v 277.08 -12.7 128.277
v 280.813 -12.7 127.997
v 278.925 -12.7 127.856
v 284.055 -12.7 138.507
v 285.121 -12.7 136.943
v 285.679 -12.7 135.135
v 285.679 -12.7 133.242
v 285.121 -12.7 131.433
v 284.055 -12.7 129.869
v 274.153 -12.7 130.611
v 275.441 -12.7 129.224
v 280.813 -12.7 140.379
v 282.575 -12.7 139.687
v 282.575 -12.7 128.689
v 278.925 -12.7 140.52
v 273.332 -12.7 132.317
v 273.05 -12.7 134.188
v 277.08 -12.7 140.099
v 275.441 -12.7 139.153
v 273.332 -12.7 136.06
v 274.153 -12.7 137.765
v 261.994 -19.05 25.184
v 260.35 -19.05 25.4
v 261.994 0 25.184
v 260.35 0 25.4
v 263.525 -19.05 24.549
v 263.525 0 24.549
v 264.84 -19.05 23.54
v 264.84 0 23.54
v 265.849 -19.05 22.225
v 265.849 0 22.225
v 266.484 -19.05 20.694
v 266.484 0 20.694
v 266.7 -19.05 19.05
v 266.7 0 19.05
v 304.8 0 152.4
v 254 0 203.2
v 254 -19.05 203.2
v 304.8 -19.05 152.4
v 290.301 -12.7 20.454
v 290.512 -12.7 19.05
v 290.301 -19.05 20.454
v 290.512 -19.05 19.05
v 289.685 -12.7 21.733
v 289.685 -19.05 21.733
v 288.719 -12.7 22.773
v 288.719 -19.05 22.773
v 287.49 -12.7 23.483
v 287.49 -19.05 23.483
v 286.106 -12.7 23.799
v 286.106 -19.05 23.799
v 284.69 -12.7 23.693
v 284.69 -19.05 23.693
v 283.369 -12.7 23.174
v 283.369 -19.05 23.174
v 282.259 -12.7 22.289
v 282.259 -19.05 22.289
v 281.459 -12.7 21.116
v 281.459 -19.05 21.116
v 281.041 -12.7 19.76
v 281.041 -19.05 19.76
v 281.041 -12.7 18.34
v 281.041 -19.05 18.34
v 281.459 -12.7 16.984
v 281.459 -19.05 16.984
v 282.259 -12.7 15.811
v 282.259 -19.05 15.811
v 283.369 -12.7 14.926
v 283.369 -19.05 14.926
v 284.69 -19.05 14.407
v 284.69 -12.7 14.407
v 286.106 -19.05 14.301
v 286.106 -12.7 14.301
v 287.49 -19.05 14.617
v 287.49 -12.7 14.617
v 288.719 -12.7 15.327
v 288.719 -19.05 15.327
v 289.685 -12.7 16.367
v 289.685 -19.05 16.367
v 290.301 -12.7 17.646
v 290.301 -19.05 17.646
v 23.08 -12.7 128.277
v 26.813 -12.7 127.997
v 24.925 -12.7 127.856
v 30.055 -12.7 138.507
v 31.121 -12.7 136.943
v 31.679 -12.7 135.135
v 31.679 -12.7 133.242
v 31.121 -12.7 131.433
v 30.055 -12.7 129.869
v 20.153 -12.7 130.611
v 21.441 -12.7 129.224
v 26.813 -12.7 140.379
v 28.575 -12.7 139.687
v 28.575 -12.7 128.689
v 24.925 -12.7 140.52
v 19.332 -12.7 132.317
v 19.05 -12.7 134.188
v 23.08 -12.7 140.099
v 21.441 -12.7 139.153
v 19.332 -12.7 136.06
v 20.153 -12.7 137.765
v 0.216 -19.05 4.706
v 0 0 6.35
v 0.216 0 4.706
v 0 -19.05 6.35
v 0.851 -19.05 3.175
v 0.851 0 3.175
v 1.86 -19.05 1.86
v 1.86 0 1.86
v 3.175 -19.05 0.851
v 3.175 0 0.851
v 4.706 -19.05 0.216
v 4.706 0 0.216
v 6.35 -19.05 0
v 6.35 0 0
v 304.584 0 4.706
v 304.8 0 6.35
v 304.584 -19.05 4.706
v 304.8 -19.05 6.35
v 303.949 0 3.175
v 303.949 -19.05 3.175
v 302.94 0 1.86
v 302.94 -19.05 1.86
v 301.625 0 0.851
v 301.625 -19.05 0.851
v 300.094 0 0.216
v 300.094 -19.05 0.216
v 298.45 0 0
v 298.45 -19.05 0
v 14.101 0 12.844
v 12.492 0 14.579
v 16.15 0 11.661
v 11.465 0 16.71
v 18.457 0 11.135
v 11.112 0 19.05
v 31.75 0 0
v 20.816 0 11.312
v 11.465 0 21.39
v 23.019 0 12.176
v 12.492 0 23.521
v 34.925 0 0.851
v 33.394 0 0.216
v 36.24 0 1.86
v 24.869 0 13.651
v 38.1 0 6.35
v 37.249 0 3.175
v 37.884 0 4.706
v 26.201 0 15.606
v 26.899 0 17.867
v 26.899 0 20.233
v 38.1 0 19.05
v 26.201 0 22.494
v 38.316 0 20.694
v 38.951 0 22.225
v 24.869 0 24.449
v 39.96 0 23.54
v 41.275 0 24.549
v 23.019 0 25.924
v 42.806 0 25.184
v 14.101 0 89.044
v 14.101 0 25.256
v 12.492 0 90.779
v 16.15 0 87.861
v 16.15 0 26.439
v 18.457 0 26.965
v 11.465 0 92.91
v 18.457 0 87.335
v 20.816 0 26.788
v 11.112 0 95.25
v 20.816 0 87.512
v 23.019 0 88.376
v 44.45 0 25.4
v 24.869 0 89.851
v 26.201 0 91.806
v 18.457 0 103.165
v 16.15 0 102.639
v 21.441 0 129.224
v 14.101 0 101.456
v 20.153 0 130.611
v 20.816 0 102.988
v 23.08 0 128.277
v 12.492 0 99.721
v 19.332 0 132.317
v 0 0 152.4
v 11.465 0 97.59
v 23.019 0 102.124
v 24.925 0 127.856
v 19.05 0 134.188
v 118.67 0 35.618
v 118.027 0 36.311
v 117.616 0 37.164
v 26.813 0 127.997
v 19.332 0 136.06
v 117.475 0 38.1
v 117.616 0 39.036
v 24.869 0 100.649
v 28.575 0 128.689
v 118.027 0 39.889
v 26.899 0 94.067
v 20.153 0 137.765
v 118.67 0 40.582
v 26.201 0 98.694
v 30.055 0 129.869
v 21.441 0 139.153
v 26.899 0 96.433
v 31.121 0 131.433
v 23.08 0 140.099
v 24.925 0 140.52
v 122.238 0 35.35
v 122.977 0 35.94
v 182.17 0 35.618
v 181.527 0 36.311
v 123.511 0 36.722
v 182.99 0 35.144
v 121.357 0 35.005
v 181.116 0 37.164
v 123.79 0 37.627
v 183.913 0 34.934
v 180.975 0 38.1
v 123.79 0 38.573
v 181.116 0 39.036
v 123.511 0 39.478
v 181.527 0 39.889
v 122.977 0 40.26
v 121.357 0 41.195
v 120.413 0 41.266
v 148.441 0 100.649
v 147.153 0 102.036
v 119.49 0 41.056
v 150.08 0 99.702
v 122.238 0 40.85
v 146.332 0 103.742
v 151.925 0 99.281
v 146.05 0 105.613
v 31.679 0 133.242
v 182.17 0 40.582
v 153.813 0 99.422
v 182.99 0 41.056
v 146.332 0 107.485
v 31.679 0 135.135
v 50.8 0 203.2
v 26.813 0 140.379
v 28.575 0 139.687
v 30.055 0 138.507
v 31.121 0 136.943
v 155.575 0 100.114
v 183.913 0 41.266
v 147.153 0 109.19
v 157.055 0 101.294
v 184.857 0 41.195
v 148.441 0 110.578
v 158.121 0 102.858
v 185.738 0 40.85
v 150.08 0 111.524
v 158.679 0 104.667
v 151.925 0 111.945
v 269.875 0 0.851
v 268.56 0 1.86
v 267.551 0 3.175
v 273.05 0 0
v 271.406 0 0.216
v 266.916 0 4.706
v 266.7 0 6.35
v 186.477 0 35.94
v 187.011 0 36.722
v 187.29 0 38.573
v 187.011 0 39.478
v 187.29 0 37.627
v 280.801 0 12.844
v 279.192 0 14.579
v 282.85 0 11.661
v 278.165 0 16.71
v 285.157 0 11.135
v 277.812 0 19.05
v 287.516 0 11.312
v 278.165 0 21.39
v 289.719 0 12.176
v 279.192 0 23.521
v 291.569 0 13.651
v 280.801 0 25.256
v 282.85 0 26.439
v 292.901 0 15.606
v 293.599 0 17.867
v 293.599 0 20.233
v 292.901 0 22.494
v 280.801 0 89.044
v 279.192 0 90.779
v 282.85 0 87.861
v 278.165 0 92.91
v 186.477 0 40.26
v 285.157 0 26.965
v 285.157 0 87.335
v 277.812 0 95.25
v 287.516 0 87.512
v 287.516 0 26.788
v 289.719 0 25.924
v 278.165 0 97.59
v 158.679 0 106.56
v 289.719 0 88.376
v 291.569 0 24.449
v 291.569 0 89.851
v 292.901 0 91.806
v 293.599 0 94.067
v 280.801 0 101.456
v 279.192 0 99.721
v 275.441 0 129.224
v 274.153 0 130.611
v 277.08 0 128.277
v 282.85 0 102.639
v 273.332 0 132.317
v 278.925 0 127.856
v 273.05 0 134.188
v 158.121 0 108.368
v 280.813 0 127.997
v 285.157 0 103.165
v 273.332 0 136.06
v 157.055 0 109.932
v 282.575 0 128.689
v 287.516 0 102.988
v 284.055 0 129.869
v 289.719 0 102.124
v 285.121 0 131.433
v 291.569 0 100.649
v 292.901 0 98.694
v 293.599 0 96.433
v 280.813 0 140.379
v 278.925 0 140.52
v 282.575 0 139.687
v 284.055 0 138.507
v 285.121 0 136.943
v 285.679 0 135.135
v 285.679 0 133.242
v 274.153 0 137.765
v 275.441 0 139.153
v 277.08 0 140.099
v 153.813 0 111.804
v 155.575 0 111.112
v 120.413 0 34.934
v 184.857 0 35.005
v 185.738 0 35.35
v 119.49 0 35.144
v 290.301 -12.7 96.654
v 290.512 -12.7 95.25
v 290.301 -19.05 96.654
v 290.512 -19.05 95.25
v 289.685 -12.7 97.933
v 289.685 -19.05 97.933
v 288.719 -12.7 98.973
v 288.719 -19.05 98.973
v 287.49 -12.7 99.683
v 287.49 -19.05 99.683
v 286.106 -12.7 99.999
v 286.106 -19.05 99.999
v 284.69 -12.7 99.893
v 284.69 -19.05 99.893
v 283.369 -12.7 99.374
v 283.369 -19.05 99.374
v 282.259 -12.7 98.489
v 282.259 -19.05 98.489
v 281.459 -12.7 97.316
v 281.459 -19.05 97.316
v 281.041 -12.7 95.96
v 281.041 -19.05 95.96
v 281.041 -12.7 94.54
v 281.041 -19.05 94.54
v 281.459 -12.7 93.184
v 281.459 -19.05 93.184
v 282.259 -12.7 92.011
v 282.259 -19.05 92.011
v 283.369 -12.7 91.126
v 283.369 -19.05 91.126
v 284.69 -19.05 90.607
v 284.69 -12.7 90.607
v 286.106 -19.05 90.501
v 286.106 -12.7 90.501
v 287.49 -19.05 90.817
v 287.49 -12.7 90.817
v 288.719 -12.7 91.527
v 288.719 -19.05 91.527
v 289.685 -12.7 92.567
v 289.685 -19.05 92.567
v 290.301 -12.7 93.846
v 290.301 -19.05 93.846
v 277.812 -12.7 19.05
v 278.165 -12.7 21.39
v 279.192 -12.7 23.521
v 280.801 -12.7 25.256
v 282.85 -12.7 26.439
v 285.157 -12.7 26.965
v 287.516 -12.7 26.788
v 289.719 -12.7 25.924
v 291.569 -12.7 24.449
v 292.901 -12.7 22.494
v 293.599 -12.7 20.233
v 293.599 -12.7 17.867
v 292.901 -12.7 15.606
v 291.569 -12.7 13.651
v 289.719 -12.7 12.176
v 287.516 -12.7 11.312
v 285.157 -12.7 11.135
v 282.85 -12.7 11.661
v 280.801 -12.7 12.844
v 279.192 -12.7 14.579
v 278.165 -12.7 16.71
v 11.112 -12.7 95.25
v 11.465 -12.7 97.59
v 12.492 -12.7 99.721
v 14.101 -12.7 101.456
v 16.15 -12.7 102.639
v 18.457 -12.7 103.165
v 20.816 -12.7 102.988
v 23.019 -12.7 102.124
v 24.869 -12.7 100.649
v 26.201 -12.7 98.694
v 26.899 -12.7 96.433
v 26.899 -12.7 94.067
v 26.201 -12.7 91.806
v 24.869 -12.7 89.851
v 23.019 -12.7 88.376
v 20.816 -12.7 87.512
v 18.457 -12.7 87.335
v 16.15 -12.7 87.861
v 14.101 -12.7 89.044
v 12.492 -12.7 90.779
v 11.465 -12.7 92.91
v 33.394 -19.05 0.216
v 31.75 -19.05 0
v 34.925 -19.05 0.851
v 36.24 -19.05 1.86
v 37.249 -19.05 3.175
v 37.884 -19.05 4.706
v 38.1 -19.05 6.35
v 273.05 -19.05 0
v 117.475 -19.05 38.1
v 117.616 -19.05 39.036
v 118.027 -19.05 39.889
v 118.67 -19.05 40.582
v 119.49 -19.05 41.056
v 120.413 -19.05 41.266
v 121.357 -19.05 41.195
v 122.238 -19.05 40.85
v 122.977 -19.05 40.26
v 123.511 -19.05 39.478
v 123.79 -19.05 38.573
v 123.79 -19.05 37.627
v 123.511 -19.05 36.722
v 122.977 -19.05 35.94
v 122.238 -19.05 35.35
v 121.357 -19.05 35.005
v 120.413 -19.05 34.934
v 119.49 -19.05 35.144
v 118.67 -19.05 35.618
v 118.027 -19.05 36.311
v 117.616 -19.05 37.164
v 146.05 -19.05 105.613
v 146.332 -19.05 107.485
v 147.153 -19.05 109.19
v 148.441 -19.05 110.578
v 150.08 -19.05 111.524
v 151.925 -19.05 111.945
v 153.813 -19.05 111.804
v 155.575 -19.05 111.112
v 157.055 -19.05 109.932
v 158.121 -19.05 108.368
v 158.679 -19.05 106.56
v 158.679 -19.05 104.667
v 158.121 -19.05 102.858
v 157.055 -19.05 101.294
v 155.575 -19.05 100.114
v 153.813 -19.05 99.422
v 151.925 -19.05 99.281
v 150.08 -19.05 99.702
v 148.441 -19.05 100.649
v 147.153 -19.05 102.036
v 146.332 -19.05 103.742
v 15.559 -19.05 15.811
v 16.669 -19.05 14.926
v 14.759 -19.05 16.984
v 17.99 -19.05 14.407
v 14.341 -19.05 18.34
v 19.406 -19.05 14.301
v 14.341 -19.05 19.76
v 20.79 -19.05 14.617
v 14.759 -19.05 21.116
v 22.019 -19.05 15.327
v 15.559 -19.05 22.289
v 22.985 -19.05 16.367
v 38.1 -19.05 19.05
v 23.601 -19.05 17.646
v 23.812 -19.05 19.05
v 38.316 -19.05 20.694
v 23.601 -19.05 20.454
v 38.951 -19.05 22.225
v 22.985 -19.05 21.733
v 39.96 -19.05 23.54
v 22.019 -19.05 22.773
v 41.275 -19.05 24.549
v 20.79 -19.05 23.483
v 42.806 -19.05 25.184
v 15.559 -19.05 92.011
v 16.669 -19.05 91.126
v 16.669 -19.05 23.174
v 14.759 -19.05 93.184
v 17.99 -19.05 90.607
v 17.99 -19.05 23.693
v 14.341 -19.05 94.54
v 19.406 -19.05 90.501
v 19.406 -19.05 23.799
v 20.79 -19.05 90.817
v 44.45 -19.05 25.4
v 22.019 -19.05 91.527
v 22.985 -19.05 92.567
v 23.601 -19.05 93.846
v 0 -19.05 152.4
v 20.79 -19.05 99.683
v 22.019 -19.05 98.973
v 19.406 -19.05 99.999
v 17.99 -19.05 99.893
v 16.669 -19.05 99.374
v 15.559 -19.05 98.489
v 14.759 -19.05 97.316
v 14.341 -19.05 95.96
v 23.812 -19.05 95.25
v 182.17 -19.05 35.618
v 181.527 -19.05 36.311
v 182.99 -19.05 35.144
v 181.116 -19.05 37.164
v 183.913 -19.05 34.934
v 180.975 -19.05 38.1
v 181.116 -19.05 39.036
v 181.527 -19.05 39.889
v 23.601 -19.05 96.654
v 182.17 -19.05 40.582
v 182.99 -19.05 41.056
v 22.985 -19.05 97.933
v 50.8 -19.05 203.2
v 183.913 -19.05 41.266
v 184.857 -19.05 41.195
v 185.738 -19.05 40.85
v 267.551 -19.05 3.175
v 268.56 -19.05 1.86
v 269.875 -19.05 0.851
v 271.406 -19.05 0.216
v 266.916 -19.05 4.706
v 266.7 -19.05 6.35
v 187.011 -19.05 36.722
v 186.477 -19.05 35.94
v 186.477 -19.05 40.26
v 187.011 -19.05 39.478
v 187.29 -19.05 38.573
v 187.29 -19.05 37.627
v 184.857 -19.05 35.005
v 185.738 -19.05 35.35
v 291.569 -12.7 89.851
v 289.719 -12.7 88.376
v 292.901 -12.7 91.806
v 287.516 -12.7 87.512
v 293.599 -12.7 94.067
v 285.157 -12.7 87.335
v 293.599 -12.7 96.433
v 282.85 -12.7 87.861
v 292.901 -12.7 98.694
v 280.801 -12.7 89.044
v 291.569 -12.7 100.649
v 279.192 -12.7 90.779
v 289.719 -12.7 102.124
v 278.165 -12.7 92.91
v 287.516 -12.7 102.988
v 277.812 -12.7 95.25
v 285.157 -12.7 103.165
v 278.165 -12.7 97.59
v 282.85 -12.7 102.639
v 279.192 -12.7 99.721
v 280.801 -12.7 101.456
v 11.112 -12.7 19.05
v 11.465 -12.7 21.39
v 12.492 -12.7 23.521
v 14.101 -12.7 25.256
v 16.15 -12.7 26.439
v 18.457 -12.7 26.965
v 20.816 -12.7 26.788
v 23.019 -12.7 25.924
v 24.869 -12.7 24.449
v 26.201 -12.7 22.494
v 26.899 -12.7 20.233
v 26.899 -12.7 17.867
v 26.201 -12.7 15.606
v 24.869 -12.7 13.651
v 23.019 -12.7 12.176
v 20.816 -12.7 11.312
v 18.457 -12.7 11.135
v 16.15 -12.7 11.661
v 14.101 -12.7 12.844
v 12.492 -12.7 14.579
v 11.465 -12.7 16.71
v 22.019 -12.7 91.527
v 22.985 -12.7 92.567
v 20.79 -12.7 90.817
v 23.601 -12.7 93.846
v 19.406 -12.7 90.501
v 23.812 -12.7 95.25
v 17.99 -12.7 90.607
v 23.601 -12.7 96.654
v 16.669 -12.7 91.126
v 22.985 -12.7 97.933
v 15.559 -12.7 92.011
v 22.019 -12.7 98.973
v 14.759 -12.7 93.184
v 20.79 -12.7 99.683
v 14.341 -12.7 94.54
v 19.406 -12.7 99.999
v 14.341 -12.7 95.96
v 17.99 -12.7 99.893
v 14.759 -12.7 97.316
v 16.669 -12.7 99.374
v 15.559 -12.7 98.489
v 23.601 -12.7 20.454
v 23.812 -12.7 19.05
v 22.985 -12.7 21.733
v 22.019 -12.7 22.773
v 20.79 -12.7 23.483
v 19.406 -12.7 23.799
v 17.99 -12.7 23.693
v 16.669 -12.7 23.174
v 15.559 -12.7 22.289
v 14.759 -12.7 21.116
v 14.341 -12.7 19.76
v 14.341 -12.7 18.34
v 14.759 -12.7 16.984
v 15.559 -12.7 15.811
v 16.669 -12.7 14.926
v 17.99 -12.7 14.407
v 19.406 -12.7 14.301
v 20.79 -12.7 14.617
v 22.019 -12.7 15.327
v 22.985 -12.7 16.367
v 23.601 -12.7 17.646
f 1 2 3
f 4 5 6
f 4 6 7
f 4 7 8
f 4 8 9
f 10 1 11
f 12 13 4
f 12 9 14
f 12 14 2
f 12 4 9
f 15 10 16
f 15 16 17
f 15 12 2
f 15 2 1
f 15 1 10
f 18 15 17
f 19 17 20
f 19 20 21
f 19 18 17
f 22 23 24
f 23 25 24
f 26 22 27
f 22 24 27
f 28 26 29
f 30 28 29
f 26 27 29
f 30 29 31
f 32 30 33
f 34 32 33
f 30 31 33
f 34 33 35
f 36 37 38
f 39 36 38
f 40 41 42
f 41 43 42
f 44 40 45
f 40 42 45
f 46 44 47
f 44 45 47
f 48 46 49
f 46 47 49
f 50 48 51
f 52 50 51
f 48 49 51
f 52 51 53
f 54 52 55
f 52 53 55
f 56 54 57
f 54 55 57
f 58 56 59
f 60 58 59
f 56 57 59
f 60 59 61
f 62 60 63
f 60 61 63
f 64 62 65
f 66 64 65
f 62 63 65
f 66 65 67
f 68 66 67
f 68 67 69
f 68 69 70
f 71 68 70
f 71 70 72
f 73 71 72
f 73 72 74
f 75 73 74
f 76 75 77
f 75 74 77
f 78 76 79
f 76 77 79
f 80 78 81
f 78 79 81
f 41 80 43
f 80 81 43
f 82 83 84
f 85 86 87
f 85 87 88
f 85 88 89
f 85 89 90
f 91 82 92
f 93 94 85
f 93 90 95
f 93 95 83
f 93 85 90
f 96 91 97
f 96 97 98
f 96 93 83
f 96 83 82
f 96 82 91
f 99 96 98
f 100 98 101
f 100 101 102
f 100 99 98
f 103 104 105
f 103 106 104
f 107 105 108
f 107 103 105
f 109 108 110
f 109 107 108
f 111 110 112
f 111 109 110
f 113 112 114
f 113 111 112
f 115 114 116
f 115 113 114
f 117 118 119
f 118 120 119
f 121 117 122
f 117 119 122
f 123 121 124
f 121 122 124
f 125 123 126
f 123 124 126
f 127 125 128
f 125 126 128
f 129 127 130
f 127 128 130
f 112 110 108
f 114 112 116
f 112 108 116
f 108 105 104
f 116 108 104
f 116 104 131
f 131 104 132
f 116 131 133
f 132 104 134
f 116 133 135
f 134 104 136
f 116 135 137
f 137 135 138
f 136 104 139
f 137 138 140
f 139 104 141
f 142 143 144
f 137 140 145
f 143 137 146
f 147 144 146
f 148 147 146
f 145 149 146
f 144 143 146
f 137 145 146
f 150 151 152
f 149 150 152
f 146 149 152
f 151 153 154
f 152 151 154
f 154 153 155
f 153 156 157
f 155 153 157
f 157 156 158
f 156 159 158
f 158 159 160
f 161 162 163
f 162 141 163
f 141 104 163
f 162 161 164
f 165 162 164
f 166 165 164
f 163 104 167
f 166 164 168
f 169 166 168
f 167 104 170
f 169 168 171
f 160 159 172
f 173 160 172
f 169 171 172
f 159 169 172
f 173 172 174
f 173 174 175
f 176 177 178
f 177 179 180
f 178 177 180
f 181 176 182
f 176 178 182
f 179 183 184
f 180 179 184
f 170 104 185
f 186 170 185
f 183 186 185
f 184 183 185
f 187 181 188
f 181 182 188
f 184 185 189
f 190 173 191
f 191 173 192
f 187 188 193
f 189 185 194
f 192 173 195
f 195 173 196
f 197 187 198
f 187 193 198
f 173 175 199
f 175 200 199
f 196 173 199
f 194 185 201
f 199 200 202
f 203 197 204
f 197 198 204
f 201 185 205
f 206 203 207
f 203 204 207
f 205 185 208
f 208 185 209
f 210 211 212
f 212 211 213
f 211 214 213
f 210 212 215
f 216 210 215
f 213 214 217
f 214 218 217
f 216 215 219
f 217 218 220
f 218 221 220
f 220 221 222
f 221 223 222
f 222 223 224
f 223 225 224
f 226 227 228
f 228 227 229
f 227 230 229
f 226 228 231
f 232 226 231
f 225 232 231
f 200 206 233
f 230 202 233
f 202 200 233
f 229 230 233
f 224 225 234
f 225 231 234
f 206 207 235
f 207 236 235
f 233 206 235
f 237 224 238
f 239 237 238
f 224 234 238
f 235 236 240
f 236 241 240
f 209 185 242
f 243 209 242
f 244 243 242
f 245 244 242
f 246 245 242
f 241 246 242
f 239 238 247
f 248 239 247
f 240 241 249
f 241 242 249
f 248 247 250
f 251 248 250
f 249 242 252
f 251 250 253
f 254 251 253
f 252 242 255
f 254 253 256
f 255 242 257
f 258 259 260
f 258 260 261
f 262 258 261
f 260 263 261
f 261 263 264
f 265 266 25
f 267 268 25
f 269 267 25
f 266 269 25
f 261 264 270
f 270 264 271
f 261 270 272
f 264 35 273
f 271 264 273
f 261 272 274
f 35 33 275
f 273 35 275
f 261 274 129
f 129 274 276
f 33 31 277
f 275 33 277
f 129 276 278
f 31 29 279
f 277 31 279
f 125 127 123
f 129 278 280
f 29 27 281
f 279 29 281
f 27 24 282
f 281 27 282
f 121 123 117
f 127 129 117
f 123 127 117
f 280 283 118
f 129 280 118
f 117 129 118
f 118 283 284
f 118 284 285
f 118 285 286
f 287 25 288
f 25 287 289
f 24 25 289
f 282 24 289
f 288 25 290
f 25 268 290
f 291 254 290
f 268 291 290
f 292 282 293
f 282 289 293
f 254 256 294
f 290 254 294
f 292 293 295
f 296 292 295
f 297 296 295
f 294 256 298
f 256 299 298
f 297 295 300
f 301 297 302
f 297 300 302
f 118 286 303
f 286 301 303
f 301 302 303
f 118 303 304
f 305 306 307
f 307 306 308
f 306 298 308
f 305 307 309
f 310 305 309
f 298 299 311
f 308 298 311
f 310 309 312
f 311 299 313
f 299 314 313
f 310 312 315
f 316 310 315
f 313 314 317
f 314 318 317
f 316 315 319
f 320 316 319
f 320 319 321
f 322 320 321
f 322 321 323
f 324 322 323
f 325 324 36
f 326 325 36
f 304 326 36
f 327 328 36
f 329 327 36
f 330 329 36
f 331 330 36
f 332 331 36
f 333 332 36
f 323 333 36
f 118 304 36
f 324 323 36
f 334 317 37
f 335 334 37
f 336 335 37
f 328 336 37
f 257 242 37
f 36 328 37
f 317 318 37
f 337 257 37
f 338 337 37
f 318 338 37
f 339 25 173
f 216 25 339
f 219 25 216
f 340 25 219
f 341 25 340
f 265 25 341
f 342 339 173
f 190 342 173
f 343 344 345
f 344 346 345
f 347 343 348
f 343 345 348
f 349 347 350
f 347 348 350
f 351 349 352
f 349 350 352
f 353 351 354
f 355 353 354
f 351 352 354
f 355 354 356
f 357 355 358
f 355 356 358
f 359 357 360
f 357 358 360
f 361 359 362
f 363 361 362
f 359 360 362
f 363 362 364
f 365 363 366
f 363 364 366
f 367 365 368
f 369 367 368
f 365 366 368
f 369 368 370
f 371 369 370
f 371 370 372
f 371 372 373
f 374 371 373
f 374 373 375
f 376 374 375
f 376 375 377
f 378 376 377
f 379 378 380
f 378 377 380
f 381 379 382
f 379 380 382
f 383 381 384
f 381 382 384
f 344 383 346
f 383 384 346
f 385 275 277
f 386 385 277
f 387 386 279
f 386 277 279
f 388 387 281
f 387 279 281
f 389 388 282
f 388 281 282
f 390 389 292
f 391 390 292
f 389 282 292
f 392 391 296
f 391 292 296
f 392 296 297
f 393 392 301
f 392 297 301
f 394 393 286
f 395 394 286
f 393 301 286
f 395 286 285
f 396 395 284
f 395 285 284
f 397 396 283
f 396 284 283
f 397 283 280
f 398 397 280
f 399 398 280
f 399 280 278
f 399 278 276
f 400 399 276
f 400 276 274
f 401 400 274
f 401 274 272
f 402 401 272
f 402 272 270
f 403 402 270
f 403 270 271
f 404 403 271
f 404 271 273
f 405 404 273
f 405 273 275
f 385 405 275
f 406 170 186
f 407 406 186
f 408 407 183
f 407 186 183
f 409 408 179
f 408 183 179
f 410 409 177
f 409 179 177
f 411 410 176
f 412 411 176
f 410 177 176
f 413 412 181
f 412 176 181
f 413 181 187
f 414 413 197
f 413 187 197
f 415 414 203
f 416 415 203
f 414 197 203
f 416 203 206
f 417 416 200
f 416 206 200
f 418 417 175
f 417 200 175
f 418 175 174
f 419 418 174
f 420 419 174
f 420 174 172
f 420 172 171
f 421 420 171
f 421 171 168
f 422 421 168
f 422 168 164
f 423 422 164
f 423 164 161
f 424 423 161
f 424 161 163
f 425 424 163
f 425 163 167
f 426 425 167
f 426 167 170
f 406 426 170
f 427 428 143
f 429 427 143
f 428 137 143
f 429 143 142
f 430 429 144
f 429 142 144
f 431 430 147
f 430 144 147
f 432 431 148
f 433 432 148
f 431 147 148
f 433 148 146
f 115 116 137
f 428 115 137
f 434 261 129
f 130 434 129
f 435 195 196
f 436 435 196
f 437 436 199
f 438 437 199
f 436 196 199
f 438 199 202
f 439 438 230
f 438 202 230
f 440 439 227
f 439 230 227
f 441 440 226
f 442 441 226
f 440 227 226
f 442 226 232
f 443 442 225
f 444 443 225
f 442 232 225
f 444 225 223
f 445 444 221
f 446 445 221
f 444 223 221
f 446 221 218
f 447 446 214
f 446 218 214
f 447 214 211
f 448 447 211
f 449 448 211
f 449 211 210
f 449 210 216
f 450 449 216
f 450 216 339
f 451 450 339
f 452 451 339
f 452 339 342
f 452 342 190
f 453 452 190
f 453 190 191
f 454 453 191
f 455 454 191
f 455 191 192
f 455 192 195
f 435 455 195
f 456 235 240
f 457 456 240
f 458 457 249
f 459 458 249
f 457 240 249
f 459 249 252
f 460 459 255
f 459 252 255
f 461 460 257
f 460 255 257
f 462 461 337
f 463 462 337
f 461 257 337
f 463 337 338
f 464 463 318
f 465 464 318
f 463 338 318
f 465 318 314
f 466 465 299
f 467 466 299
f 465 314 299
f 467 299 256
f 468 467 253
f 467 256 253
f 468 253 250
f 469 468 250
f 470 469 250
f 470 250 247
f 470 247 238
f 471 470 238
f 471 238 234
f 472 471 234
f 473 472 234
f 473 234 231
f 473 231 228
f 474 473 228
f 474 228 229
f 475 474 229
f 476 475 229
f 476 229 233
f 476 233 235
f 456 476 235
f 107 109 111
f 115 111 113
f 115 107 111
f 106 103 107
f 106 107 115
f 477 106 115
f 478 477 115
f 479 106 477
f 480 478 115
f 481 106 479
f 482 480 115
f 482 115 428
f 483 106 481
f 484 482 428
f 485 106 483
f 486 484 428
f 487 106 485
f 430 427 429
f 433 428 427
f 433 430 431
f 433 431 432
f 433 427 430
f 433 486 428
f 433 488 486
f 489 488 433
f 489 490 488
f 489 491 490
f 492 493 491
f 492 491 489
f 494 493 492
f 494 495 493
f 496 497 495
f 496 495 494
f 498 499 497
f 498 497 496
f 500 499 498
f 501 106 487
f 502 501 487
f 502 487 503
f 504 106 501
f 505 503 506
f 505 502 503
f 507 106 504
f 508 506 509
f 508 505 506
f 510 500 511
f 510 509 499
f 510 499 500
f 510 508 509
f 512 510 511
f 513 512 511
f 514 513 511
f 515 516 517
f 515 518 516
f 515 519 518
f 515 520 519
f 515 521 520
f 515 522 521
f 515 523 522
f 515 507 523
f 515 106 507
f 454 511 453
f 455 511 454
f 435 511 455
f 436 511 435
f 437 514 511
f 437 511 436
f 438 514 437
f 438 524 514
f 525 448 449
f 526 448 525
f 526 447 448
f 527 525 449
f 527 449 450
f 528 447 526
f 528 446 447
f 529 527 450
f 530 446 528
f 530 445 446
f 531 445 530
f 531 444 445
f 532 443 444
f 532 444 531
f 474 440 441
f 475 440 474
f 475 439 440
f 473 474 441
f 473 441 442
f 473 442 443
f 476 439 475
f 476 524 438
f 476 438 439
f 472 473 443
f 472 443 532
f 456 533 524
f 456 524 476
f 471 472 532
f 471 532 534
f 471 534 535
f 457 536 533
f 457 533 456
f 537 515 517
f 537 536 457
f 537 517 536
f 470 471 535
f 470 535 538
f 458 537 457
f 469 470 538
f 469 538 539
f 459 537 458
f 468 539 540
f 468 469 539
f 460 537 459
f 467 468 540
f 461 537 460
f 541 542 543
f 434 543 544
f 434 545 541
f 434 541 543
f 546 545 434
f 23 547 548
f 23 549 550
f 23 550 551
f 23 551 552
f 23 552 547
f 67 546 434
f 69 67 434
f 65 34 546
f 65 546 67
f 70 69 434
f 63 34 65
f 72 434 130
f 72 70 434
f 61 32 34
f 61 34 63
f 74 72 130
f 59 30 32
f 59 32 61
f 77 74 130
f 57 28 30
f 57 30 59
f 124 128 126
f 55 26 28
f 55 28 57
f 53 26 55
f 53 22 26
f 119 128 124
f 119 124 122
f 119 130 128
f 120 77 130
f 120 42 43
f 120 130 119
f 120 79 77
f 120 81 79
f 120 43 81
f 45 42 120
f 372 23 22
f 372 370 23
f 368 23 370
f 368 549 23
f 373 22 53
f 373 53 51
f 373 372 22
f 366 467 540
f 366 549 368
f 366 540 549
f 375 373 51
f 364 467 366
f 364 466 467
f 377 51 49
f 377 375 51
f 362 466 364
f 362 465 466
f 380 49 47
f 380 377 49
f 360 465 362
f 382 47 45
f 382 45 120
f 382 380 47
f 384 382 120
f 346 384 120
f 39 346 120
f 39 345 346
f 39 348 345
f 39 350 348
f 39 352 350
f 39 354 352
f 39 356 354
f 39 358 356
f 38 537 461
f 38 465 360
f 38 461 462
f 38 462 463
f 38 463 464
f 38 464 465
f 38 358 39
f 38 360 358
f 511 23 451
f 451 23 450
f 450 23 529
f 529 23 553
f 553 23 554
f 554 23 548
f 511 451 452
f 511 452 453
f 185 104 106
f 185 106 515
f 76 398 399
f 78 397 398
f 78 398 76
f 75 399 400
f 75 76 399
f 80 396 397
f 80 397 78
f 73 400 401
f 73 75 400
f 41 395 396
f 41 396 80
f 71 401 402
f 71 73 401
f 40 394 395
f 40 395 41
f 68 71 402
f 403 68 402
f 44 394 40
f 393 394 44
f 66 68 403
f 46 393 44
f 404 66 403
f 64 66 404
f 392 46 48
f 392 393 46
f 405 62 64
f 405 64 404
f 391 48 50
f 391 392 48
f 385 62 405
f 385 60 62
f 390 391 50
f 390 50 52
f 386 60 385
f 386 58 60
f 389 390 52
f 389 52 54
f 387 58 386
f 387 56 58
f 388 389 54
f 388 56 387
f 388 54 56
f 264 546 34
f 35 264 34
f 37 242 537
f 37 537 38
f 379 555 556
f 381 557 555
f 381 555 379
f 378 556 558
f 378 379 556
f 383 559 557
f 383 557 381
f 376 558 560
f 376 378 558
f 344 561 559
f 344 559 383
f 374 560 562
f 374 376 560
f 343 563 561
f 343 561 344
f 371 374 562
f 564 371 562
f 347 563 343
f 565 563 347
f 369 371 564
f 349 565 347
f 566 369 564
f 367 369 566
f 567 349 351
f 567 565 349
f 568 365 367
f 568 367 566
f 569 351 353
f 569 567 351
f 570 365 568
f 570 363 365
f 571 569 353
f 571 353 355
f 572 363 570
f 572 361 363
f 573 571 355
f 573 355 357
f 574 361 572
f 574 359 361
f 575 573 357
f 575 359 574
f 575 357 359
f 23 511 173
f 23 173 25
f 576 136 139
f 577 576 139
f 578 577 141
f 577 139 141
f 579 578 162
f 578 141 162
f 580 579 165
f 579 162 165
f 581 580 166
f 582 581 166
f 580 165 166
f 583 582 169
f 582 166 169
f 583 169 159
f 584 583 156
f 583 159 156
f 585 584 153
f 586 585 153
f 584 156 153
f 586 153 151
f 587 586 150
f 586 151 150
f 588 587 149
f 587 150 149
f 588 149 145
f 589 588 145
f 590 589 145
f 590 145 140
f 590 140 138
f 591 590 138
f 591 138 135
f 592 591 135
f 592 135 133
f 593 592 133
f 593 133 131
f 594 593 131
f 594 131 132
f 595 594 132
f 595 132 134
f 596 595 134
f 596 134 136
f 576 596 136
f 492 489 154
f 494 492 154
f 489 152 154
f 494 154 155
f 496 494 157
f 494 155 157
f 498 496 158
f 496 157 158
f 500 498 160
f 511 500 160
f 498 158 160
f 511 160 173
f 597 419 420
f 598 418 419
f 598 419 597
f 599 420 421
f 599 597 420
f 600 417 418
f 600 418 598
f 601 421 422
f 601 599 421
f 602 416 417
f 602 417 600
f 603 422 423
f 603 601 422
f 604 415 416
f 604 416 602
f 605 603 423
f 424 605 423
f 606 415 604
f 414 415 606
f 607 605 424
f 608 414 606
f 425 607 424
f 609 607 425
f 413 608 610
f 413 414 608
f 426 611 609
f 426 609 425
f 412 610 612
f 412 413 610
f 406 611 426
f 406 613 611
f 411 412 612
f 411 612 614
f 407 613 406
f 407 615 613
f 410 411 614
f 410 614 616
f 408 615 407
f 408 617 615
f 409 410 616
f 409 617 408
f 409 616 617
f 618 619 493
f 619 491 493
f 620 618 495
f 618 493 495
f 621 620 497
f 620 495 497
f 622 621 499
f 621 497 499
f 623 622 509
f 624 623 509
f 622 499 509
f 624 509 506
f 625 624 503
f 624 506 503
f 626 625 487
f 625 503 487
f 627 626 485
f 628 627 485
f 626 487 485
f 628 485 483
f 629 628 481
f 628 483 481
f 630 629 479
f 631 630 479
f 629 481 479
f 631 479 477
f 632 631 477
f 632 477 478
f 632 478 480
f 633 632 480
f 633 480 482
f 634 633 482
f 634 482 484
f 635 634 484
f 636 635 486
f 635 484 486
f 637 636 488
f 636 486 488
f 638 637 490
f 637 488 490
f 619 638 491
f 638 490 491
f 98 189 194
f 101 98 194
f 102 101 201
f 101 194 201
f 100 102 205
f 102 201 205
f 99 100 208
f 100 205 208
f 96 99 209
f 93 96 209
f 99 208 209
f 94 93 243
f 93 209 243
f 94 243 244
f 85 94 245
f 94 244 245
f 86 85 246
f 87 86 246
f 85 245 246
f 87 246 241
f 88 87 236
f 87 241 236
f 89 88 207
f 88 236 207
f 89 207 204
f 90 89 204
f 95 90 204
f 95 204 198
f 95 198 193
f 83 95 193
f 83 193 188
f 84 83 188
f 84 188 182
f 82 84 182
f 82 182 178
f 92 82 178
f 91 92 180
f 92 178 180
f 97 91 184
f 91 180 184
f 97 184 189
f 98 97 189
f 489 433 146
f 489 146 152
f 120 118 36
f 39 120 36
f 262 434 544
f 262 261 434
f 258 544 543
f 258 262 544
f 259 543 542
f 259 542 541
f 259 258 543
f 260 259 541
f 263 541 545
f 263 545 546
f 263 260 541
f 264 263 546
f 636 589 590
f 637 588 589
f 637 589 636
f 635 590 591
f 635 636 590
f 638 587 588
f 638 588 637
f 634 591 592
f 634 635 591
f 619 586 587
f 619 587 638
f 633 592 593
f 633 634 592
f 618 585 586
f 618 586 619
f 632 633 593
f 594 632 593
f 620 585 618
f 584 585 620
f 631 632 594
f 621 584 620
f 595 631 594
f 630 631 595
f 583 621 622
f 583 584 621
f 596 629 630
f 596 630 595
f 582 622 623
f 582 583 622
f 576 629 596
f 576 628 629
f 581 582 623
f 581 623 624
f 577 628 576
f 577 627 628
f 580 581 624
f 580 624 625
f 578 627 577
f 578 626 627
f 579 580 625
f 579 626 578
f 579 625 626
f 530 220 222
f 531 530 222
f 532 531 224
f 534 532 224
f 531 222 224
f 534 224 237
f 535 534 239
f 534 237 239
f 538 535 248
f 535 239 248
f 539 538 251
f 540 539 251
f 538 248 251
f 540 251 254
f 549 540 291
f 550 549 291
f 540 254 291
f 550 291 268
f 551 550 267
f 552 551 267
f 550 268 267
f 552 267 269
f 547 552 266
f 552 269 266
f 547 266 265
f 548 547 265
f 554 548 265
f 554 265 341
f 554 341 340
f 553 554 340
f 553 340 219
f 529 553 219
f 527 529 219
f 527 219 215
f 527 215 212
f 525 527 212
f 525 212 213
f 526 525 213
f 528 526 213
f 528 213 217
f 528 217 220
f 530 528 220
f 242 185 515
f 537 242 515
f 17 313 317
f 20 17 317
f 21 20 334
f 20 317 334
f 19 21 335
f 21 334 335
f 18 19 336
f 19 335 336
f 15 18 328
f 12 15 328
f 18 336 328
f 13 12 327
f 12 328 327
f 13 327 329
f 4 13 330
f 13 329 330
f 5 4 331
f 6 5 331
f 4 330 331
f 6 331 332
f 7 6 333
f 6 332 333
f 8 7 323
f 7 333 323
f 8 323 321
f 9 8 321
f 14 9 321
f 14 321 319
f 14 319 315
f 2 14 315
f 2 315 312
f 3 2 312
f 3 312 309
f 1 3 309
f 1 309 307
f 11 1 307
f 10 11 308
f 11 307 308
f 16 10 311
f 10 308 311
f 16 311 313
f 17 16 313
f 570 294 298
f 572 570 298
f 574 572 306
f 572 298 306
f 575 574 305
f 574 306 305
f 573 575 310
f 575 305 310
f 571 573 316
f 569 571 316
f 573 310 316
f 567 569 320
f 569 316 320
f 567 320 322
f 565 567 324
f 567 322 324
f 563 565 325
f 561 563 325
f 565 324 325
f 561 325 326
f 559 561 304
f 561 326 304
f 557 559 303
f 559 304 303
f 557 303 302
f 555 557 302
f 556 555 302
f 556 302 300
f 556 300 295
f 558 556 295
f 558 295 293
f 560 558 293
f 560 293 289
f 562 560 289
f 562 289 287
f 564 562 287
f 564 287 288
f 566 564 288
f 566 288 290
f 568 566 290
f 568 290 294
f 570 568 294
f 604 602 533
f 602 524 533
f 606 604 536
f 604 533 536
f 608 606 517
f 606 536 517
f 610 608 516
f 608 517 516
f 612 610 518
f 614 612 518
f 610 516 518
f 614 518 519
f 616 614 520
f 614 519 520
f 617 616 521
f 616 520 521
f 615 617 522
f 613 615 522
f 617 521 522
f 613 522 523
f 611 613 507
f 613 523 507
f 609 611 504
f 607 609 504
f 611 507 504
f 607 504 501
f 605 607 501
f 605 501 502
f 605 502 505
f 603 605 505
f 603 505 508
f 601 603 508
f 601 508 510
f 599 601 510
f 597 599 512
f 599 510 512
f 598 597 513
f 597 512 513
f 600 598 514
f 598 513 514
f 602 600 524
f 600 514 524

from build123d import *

# Parameters (mm, degrees)
F0_W            = 304.8
F0_H            = 203.2
F1_DEPTH        = 19.05
F2_W            = 228.6
F2_H            = 25.4
F3_DEPTH        = 19.051
F5_D            = 6.35
F6_R            = 6.35
F8_D            = 12.7
F9_R            = 6.35
F10_DEPTH       = 12.7
F12_D           = 9.525
F12_CBORE_D     = 15.875
F12_CBORE_DEPTH = 12.7
F13_SIZE        = 50.8


with BuildPart() as f1:
    # F0 (on Front) → F1 (new body)
    with BuildSketch(Plane.XZ):
        with Locations((152.4, 101.6)):
            Rectangle(F0_W, F0_H)
    extrude(amount=F1_DEPTH)

    # F2 (on face) → F3 (cut, through all)
    with BuildSketch(Plane.XZ.offset(19.05)):
        with Locations((152.4, 12.7)):
            Rectangle(F2_W, F2_H)
    extrude(amount=-F3_DEPTH, mode=Mode.SUBTRACT)

    # F5 (through all)
    with Locations(Plane.XZ.offset(19.05)):
        with Locations((120.65, 38.1), (184.15, 38.1)):
            Hole(F5_D / 2)

    # F6
    f6_edges = [f1.edges().sort_by_distance(p)[0] for p in [
        (38.1, -9.525, 25.4),
        (38.1, -9.525, 0),
        (0, -9.525, 0),
        (266.7, -9.525, 25.4),
        (266.7, -9.525, 0),
        (304.8, -9.525, 0),
    ]]
    fillet(f6_edges, radius=F6_R)

    # F8 (through all)
    with Locations(Plane.XZ.offset(19.05)):
        with Locations((152.4, 105.6132)):
            Hole(F8_D / 2)

    # F9 (on face) → F10 (cut)
    with BuildSketch(Plane(origin=(0, 0, 0), x_dir=(-1, 0, 0), z_dir=(0, 1, 0))):
        with Locations((-25.4, 134.1882)):
            Circle(F9_R)
        with Locations((-279.4, 134.1882)):
            Circle(F9_R)
    extrude(amount=-F10_DEPTH, mode=Mode.SUBTRACT)

    # F12 (through all)
    with Locations(Plane(origin=(0, 0, 0), x_dir=(-1, 0, 0), z_dir=(0, 1, 0))):
        with Locations((-285.75, 95.25), (-285.75, 19.05), (-19.05, 19.05), (-19.05, 95.25)):
            CounterBoreHole(F12_D / 2, F12_CBORE_D / 2, F12_CBORE_DEPTH)

    # F13
    f13_edges = [f1.edges().sort_by_distance(p)[0] for p in [
        (0, -9.525, 203.2),
        (304.8, -9.525, 203.2),
    ]]
    chamfer(f13_edges, length=F13_SIZE)


solid = f1.part
